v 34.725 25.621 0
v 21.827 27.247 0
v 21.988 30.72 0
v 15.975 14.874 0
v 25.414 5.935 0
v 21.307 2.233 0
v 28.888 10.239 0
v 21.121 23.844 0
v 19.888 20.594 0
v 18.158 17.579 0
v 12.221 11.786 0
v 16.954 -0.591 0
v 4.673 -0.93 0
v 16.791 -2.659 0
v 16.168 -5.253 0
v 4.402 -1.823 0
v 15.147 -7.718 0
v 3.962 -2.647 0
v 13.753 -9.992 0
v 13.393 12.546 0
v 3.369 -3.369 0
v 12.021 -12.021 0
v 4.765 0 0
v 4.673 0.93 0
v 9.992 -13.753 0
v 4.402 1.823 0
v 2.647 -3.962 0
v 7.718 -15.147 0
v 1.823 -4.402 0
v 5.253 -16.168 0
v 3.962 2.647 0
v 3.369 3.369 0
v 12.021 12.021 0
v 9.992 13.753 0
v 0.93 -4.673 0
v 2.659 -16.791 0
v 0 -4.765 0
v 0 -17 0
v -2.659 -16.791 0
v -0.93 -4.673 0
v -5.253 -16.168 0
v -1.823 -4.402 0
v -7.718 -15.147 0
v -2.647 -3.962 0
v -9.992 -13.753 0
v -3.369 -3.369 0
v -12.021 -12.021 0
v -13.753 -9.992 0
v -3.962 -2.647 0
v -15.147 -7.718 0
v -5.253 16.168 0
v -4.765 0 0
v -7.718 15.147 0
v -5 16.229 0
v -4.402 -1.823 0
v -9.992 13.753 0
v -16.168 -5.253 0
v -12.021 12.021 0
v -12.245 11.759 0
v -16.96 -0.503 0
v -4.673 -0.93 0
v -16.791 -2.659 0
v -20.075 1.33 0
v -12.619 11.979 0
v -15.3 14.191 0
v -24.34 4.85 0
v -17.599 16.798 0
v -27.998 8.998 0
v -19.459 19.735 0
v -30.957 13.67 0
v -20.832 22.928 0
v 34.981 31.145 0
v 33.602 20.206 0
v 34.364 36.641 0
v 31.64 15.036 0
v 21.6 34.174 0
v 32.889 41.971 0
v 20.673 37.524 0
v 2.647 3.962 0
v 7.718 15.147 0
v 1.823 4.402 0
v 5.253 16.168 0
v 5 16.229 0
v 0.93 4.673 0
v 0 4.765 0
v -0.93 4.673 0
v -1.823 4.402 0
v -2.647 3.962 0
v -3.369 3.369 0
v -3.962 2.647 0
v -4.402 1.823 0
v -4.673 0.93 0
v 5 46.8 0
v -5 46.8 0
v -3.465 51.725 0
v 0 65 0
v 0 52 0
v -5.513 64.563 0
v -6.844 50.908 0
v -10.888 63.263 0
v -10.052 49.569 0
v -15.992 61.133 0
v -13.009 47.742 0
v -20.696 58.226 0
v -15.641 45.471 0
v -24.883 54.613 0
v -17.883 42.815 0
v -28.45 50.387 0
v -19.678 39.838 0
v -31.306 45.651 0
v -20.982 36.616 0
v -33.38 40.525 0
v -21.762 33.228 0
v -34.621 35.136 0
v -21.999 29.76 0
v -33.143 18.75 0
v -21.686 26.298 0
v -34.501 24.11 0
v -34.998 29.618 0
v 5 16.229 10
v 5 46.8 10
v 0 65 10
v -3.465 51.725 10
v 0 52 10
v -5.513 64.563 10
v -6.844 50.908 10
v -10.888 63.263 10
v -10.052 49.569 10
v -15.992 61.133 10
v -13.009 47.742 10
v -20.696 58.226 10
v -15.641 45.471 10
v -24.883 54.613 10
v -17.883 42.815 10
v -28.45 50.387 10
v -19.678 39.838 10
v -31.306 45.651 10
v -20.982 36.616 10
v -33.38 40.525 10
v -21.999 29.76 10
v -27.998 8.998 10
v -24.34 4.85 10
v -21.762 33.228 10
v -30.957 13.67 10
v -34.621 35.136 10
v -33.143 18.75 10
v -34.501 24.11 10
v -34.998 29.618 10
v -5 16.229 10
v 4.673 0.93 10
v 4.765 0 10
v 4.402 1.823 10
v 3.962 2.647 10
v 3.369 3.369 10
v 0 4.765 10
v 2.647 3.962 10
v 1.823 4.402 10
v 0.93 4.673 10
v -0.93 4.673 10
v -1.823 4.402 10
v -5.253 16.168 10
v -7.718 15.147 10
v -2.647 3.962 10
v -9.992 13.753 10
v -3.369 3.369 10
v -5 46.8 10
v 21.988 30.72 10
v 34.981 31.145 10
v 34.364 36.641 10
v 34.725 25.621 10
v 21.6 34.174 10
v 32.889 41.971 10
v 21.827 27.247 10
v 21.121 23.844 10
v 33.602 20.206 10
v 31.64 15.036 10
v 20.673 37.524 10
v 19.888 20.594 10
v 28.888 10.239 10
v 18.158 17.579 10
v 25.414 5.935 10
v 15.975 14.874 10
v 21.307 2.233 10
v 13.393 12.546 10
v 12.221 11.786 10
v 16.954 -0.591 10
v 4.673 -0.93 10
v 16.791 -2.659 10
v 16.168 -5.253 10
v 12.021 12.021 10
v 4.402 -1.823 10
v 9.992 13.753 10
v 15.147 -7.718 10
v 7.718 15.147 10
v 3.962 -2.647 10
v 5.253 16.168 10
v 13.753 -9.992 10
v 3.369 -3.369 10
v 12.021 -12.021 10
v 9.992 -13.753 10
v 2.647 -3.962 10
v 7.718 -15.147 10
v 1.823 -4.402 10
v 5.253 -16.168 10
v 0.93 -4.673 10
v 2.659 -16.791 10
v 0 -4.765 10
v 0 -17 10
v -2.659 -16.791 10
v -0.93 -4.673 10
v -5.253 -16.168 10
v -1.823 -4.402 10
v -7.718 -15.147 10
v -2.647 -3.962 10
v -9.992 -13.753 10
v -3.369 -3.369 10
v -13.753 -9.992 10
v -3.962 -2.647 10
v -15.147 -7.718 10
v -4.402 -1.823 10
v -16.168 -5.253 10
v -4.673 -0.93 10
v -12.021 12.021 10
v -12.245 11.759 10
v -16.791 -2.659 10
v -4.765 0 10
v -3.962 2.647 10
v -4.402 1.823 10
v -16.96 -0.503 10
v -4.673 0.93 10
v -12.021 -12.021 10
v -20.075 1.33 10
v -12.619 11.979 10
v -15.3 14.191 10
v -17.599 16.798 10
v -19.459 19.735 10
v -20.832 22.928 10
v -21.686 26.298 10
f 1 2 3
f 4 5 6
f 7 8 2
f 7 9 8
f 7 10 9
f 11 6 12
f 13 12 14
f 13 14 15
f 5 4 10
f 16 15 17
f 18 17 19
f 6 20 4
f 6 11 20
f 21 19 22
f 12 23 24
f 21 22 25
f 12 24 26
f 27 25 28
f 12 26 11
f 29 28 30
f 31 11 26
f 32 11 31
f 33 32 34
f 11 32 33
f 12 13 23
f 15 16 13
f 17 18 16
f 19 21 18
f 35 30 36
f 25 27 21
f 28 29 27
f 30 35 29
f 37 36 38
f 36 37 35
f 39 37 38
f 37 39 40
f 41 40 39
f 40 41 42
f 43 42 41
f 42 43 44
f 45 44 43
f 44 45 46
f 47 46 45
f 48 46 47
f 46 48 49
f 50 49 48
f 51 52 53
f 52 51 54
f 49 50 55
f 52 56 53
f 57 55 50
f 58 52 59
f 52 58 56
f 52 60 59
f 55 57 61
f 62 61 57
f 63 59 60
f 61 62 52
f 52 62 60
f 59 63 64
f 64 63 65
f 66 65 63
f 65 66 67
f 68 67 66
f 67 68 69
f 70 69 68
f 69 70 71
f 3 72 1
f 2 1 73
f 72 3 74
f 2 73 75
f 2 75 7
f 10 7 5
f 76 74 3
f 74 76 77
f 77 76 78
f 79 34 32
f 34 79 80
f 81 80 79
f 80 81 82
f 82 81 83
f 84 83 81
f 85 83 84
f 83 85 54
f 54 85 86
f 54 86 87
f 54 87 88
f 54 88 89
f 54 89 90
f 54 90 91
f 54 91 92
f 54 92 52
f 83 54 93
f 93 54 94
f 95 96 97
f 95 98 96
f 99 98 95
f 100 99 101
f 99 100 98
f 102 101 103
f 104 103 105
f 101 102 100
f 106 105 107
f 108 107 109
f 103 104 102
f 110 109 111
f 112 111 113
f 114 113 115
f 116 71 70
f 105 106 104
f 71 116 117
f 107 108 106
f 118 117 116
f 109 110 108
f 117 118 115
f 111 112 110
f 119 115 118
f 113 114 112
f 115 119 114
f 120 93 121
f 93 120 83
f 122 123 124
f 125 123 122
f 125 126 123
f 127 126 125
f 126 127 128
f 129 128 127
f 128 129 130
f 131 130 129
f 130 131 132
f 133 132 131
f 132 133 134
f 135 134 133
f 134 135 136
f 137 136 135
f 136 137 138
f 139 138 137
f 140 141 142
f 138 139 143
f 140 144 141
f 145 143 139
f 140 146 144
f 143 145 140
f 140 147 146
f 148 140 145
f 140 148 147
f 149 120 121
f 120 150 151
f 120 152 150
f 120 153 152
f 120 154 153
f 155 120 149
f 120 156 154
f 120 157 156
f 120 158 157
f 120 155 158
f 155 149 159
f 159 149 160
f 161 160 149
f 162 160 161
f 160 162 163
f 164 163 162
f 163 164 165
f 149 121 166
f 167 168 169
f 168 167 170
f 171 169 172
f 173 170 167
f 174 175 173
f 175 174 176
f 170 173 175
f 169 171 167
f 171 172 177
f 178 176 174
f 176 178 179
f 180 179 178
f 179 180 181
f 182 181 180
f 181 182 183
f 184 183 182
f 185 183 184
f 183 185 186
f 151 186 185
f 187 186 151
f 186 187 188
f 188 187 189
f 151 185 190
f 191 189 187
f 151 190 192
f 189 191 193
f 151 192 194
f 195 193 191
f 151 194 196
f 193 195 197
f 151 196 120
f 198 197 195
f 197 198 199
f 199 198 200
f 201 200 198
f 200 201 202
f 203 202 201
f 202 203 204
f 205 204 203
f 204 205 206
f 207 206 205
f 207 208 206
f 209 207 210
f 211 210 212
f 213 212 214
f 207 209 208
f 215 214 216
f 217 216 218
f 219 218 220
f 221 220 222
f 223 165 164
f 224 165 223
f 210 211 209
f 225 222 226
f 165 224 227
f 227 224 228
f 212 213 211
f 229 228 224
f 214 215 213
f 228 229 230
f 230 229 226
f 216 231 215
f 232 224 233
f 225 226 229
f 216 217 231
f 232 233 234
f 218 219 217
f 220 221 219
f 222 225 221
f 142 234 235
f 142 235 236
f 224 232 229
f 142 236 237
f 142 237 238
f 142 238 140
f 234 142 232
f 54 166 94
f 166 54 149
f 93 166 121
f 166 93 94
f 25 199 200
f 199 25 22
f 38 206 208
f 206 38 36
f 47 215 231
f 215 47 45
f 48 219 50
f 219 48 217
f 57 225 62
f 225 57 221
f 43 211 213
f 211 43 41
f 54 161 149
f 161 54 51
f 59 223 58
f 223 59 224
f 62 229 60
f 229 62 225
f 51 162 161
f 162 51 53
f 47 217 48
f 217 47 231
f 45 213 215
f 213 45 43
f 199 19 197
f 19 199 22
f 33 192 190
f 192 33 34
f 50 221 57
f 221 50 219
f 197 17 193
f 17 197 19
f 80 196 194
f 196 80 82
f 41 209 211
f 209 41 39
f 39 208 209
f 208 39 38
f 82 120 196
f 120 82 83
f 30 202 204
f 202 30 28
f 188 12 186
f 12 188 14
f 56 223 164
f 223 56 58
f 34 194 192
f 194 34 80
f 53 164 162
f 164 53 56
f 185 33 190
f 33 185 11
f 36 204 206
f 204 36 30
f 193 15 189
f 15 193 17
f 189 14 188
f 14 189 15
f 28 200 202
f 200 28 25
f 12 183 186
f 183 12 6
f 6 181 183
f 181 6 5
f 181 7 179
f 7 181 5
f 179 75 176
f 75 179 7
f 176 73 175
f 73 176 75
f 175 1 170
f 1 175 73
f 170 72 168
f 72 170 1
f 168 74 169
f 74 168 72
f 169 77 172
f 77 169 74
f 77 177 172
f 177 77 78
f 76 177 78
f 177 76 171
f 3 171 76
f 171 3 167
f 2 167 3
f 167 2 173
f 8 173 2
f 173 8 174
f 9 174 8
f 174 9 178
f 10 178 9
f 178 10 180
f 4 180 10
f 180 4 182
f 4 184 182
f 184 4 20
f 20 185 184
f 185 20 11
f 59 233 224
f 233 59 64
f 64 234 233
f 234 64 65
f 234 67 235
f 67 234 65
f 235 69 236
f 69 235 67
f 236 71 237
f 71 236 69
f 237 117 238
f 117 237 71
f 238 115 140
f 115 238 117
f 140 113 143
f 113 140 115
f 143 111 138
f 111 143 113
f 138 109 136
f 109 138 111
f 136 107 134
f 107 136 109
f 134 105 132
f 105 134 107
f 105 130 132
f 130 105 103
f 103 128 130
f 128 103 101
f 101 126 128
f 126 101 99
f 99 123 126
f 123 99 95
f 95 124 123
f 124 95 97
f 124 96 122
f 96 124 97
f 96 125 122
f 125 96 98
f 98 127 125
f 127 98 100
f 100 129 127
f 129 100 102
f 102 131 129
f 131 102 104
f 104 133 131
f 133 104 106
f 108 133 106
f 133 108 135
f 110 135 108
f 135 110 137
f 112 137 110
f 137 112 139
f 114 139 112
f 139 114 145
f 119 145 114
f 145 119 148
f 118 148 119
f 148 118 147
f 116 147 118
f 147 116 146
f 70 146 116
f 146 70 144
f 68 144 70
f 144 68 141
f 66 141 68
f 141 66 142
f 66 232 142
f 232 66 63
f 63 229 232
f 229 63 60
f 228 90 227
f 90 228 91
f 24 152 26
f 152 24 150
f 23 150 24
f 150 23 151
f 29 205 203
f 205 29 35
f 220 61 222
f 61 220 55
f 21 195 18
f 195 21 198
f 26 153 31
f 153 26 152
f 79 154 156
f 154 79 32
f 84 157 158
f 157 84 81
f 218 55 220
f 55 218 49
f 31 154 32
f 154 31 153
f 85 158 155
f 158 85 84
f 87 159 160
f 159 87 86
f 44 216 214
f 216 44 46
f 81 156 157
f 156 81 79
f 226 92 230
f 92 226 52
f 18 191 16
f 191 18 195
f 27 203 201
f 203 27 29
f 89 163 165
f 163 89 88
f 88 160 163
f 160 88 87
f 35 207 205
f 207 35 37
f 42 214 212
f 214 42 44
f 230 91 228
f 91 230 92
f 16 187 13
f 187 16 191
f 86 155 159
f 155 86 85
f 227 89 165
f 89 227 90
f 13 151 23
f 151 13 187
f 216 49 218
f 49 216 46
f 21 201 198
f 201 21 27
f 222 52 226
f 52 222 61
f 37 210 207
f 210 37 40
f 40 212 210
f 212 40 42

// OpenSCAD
$fn = 32;

// ----------------------------------------------------------------------
// Hook: 60 mm shank into a 22 mm curl, 10 mm thick
// ----------------------------------------------------------------------

// --- parameters (mm) ---
shank_len = 60;           // shank length from the boss centre
shank_w = 10;             // shank width
boss_d = 34;              // boss diameter
bore_d = 9.53;            // boss bore
curl_in = 22;             // curl inner radius
curl_out = 35;            // curl outer radius
curl_sweep = 290;         // curl sweep angle
hook_t = 10;              // hook thickness

shank_profile = [[-5, 46.8], [5, 46.8], [5, 15], [-5, 15]];
boss_profile = [[17, 0], [16.791, 2.659], [16.168, 5.253], [15.147, 7.718], [13.753, 9.992], [12.021, 12.021], [9.992, 13.753], [7.718, 15.147], [5.253, 16.168], [2.659, 16.791], [0, 17], [-2.659, 16.791], [-5.253, 16.168], [-7.718, 15.147], [-9.992, 13.753], [-12.021, 12.021], [-13.753, 9.992], [-15.147, 7.718], [-16.168, 5.253], [-16.791, 2.659], [-17, 0], [-16.791, -2.659], [-16.168, -5.253], [-15.147, -7.718], [-13.753, -9.992], [-12.021, -12.021], [-9.992, -13.753], [-7.718, -15.147], [-5.253, -16.168], [-2.659, -16.791], [0, -17], [2.659, -16.791], [5.253, -16.168], [7.718, -15.147], [9.992, -13.753], [12.021, -12.021], [13.753, -9.992], [15.147, -7.718], [16.168, -5.253], [16.791, -2.659]];
curl_profile = [[0, 65], [-5.513, 64.563], [-10.888, 63.263], [-15.992, 61.133], [-20.696, 58.226], [-24.883, 54.613], [-28.45, 50.387], [-31.306, 45.651], [-33.38, 40.525], [-34.621, 35.136], [-34.998, 29.618], [-34.501, 24.11], [-33.143, 18.75], [-30.957, 13.67], [-27.998, 8.998], [-24.34, 4.85], [-20.075, 1.33], [-15.309, -1.475], [-10.16, -3.493], [-4.758, -4.675], [0.764, -4.992], [6.266, -4.435], [11.611, -3.018], [16.667, -0.777], [21.307, 2.233], [25.414, 5.935], [28.888, 10.239], [31.64, 15.036], [33.602, 20.206], [34.725, 25.621], [34.981, 31.145], [34.364, 36.641], [32.889, 41.971], [20.673, 37.524], [21.6, 34.174], [21.988, 30.72], [21.827, 27.247], [21.121, 23.844], [19.888, 20.594], [18.158, 17.579], [15.975, 14.874], [13.393, 12.546], [10.476, 10.655], [7.298, 9.246], [3.938, 8.355], [0.48, 8.005], [-2.99, 8.204], [-6.386, 8.947], [-9.623, 10.216], [-12.619, 11.979], [-15.3, 14.191], [-17.599, 16.798], [-19.459, 19.735], [-20.832, 22.928], [-21.686, 26.298], [-21.999, 29.76], [-21.762, 33.228], [-20.982, 36.616], [-19.678, 39.838], [-17.883, 42.815], [-15.641, 45.471], [-13.009, 47.742], [-10.052, 49.569], [-6.844, 50.908], [-3.465, 51.725], [0, 52]];

difference() {
  union() {
    /* three overlapping outlines: shank, boss and the smooth curl */
    linear_extrude(height = hook_t) polygon(shank_profile);
    linear_extrude(height = hook_t) polygon(boss_profile);
    linear_extrude(height = hook_t) polygon(curl_profile);
  }
  translate([0, 0, -2.5]) cylinder(h = hook_t + 5, d = bore_d);
}
